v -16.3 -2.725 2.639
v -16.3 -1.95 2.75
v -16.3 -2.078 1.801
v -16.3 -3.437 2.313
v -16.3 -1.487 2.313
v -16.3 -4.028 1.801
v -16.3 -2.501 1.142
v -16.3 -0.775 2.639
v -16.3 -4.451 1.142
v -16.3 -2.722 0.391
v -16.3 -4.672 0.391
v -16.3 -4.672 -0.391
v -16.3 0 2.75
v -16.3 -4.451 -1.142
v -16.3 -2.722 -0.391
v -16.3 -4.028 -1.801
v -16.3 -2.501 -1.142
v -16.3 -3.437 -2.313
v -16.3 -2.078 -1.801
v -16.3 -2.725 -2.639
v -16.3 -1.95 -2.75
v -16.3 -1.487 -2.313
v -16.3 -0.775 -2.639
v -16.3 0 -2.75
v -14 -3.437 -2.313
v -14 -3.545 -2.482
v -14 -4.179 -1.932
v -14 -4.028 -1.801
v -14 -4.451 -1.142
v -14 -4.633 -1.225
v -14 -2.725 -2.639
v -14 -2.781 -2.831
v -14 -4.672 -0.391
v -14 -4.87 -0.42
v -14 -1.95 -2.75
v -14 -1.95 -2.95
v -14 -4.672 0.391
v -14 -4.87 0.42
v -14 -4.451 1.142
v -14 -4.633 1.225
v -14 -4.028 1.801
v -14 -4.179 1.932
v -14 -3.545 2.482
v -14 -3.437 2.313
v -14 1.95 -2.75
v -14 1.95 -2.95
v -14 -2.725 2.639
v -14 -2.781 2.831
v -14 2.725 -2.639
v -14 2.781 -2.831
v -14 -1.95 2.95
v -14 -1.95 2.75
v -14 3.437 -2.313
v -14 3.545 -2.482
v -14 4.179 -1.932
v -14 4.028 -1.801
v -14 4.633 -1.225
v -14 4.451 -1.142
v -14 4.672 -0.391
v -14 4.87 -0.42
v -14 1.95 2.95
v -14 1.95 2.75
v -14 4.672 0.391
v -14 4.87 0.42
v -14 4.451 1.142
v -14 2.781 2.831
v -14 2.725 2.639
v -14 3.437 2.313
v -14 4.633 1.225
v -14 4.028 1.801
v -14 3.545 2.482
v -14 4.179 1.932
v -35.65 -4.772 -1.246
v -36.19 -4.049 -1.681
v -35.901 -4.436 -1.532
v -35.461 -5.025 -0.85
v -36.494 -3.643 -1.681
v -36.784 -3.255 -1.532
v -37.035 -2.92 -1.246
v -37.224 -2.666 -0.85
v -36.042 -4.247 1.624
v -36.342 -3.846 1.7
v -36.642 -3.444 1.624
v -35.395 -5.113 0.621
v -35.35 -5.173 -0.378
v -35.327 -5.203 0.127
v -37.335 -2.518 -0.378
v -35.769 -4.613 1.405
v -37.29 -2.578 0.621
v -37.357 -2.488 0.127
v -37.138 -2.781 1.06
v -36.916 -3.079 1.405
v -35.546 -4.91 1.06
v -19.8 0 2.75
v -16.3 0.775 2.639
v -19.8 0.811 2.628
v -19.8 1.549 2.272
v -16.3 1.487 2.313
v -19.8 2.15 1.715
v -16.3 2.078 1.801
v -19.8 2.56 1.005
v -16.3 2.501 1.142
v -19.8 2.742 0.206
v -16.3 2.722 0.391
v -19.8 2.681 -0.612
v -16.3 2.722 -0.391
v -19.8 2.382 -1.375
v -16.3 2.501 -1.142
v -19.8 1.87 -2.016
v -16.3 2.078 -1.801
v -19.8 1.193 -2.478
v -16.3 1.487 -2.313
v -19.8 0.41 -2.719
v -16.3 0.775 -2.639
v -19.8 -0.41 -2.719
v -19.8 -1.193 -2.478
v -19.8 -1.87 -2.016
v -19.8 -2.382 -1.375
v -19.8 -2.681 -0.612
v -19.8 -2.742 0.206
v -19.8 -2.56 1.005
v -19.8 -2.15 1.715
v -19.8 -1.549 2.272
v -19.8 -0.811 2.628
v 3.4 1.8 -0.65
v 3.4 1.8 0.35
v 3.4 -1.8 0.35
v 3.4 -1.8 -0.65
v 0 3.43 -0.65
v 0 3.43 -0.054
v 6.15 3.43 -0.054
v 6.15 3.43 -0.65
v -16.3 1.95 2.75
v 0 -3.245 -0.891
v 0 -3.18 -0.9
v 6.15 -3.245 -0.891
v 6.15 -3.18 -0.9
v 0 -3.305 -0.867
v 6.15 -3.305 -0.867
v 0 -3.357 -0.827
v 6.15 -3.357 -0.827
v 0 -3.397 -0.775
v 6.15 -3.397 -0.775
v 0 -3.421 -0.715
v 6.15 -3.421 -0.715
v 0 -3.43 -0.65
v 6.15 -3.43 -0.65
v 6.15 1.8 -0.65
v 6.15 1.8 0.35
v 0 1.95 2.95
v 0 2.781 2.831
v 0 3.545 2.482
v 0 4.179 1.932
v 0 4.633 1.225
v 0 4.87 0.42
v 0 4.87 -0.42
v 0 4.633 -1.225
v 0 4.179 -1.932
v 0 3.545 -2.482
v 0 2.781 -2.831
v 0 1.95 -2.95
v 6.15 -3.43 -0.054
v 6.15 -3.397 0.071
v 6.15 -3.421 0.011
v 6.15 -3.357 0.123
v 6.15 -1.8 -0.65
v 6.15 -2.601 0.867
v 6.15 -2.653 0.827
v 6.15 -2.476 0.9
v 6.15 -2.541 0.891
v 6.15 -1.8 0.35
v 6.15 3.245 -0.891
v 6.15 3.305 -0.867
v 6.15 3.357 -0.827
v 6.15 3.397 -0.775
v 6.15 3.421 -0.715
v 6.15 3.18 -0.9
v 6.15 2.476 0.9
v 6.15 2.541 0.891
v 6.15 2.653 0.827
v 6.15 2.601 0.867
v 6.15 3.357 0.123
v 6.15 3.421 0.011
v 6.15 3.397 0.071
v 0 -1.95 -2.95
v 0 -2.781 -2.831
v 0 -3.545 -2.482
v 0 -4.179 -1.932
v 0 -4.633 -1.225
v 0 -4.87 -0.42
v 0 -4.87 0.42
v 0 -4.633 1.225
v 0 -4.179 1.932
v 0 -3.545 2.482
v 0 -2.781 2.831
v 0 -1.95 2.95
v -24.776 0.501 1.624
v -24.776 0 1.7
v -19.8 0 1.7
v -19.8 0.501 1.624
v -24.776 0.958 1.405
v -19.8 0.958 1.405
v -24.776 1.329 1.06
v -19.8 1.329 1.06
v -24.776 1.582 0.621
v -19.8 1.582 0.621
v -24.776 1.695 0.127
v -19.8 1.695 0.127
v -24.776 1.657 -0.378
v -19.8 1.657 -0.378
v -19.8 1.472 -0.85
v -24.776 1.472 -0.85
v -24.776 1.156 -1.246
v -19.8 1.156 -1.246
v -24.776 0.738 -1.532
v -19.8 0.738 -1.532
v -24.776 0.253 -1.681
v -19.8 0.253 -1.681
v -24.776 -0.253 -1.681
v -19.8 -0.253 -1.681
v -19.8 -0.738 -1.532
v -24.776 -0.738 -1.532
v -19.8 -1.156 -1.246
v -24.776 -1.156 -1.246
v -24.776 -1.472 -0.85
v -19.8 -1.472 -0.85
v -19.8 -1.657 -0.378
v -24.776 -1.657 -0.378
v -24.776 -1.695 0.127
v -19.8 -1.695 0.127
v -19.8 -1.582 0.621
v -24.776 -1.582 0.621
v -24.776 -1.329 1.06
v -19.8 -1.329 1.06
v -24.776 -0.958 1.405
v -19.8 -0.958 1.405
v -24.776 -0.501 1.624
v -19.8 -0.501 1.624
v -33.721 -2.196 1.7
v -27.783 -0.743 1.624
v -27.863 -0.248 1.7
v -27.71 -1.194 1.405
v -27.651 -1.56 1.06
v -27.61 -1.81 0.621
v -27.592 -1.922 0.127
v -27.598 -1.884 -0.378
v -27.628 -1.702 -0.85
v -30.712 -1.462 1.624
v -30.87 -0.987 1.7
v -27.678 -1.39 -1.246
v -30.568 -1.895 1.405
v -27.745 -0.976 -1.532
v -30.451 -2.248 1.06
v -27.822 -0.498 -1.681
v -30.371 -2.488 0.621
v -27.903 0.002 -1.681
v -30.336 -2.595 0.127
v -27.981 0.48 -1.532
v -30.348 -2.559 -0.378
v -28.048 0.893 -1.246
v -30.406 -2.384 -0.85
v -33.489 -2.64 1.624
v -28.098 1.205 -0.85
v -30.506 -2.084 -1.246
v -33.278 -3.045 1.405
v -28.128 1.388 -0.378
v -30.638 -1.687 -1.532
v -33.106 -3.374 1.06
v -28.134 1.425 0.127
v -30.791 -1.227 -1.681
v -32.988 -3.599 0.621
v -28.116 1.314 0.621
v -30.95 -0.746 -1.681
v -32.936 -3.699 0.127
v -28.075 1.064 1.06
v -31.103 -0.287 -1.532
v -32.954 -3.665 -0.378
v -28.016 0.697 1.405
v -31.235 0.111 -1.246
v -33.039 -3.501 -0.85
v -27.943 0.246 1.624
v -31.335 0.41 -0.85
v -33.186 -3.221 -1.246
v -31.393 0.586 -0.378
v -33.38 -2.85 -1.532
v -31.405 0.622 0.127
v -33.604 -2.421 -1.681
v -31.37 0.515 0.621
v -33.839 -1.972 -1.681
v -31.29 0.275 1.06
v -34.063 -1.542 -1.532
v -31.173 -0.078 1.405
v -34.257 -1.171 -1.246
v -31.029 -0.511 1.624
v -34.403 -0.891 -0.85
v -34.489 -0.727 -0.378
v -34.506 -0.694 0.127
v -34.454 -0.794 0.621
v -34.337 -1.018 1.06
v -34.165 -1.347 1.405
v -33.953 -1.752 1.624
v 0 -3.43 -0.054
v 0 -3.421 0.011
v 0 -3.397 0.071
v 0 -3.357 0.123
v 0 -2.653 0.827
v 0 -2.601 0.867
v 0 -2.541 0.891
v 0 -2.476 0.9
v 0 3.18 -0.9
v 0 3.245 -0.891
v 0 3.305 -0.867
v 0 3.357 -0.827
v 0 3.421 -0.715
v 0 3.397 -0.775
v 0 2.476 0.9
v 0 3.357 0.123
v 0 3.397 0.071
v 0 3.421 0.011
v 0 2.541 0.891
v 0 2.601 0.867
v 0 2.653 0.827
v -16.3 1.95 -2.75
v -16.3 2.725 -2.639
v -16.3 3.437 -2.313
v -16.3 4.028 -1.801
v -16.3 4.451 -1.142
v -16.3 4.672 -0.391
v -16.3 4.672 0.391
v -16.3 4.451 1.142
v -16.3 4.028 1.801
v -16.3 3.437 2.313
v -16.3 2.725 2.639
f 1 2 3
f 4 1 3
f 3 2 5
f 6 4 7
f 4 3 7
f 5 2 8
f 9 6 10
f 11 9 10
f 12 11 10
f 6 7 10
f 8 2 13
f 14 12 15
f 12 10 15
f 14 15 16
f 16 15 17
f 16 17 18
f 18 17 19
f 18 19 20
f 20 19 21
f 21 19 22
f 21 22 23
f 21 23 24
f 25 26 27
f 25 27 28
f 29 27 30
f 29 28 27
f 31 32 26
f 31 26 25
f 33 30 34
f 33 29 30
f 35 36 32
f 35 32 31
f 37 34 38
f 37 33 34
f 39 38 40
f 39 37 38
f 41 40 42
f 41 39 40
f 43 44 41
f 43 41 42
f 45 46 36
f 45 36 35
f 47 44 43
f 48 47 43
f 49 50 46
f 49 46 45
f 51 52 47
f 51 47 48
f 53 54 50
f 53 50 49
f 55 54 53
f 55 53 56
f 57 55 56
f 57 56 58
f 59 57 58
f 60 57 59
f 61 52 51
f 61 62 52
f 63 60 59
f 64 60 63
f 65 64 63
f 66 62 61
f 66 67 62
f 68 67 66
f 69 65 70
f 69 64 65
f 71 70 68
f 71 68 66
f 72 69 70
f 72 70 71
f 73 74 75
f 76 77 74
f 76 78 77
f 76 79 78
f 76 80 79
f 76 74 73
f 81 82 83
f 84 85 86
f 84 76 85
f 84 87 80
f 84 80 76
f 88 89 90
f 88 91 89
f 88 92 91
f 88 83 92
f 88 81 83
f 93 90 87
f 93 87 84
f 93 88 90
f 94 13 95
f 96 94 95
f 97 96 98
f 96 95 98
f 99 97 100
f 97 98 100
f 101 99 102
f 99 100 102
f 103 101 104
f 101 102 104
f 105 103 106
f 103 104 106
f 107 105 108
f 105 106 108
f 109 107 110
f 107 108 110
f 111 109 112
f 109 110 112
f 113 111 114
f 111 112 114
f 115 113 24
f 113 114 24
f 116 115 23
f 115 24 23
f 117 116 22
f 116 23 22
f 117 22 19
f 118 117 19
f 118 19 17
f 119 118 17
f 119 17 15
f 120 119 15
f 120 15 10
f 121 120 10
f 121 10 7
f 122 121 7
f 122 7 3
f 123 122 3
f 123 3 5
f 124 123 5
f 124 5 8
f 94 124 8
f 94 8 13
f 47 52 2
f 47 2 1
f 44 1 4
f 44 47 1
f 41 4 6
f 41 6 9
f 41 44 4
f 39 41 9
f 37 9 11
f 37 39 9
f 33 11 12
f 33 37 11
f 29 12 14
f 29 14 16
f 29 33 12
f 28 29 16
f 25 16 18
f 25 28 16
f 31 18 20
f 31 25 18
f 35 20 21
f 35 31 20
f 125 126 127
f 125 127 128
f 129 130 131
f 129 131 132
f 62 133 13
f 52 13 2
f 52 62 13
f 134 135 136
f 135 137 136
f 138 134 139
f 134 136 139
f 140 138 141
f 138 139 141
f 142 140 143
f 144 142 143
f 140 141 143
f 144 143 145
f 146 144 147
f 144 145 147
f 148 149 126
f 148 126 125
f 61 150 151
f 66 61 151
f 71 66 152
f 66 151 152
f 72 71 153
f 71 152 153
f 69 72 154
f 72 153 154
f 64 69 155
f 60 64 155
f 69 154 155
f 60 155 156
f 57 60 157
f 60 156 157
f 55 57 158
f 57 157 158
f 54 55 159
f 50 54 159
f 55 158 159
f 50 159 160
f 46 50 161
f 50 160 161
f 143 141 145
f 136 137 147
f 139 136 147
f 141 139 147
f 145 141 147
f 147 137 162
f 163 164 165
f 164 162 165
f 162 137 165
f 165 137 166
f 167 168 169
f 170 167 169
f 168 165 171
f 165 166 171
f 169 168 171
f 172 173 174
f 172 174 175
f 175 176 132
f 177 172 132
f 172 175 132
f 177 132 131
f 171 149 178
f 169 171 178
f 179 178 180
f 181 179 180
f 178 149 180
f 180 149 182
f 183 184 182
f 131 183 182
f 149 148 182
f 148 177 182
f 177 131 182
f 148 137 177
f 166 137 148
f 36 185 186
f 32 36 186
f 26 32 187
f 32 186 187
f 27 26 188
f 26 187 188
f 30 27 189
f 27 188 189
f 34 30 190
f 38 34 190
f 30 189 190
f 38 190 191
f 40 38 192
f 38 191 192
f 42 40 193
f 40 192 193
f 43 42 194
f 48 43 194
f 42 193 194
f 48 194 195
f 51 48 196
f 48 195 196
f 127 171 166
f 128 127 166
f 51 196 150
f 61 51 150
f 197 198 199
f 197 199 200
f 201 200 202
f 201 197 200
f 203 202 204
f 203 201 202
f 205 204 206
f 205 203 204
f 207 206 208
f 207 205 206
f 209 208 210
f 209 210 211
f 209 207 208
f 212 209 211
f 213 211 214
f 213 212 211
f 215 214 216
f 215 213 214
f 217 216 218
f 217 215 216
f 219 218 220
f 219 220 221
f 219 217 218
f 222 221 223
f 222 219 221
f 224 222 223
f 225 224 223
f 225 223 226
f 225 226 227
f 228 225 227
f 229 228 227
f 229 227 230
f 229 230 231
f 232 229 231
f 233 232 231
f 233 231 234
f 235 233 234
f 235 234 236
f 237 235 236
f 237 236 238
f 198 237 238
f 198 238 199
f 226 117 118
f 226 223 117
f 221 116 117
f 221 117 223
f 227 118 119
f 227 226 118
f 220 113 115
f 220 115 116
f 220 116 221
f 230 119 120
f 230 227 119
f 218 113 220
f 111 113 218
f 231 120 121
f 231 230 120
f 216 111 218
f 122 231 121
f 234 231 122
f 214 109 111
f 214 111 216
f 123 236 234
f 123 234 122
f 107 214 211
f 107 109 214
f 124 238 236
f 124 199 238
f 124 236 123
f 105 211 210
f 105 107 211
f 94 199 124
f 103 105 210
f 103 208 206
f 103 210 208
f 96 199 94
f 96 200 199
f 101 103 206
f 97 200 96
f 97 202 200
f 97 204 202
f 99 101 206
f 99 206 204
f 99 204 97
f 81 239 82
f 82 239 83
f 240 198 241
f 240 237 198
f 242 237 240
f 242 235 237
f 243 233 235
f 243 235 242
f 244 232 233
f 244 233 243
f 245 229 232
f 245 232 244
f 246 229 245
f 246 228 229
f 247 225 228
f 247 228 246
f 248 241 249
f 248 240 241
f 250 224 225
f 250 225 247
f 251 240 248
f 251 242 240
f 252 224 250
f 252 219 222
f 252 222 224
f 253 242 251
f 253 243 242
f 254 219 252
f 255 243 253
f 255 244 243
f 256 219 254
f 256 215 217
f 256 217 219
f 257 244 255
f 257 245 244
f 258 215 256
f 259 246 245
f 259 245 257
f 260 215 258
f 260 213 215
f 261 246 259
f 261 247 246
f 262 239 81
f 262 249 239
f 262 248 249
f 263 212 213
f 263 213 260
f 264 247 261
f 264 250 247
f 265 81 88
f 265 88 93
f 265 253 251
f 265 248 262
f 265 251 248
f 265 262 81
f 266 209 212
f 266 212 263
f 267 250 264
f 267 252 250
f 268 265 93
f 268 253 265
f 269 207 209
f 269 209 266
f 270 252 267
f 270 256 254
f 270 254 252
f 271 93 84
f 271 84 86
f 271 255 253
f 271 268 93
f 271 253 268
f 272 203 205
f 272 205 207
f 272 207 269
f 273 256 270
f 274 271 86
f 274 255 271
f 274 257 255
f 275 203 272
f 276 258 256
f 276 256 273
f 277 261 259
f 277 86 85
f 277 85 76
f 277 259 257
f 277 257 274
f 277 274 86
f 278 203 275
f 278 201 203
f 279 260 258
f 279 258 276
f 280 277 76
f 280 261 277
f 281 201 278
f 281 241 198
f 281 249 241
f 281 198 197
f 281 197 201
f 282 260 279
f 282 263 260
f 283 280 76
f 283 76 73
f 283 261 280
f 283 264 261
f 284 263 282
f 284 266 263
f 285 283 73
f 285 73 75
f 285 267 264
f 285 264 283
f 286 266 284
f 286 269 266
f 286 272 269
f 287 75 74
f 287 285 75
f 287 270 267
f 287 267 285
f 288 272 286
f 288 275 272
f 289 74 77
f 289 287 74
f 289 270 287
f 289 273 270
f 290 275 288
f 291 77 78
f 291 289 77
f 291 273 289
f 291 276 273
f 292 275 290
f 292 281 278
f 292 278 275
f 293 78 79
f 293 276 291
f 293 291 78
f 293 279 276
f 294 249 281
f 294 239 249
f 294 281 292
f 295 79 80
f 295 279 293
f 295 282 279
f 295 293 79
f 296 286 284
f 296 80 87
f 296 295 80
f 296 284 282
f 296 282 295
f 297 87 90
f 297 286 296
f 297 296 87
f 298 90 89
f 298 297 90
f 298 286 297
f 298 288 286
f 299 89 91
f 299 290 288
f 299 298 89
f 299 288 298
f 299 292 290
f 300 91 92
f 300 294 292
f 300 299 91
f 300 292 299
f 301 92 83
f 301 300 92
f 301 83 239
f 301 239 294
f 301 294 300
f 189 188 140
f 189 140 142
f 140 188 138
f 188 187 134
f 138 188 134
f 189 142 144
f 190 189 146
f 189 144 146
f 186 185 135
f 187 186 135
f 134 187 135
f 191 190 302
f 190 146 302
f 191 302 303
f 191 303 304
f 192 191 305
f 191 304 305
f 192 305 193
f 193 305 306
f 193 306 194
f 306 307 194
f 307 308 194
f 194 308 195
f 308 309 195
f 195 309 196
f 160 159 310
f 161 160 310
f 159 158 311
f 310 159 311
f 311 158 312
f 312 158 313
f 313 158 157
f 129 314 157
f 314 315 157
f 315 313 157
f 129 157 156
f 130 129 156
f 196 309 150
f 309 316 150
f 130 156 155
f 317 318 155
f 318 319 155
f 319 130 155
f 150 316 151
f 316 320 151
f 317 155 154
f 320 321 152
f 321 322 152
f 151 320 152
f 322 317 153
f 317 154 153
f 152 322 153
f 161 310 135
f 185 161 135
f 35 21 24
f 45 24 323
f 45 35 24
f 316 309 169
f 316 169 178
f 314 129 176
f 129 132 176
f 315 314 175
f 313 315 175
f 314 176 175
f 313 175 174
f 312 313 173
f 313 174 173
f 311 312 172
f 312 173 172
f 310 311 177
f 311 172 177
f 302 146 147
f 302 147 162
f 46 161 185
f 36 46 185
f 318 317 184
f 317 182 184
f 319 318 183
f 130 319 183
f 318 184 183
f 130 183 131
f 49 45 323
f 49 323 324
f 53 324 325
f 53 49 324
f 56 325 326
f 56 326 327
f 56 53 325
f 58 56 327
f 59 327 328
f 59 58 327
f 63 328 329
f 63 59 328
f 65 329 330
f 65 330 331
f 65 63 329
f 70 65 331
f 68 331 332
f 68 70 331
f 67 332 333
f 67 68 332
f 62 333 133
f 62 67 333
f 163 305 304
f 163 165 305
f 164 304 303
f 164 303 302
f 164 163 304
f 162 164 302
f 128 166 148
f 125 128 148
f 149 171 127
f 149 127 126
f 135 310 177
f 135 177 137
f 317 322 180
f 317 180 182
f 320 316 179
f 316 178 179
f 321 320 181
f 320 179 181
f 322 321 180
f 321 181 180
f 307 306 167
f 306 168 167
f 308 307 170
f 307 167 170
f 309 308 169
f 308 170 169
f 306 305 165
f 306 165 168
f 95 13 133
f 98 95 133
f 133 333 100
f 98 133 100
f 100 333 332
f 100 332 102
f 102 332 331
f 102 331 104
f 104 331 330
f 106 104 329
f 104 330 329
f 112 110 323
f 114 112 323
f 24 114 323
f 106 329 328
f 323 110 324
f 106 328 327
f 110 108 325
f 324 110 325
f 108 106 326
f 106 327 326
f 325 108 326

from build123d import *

# Parameters (mm, degrees)
EXTRUDE_1_DEPTH     = 14
EXTRUDE_2_DEPTH     = 2.3
SKETCH_4_R          = 2.75
EXTRUDE_3_DEPTH     = 3.5
SKETCH_5_R          = 1.7
EXTRUDE_4_DEPTH     = 6.15
FILLET_1_R          = 0.25
SKETCH_8_W          = 1
SKETCH_8_H          = 3.6
CUT_EXTRUDE_1_DEPTH = 2.75


with BuildPart() as part:
    # Эскиз1 → Бобышка-Вытянуть1 (new body)
    with BuildSketch(Plane(origin=(0, 0, 0), x_dir=(0, 0, -1), z_dir=(1, 0, 0))):
        with BuildLine():
            Line((-2.95, -1.95), (-2.95, 1.95))
            ThreePointArc((-2.95, 1.95), (0, 4.9), (2.95, 1.95))
            Line((2.95, 1.95), (2.95, -1.95))
            ThreePointArc((2.95, -1.95), (0, -4.9), (-2.95, -1.95))
        make_face()
    extrude(amount=-EXTRUDE_1_DEPTH)

    # Эскиз3 → Бобышка-Вытянуть2 (add)
    with BuildSketch(Plane.ZY.offset(14)):
        with BuildLine():
            Line((2.75, 1.95), (2.75, -1.95))
            ThreePointArc((2.75, -1.95), (0, -4.7), (-2.75, -1.95))
            Line((-2.75, -1.95), (-2.75, 1.95))
            ThreePointArc((-2.75, 1.95), (0, 4.7), (2.75, 1.95))
        make_face()
    extrude(amount=EXTRUDE_2_DEPTH)

    # Эскиз4 → Бобышка-Вытянуть3 (add)
    with BuildSketch(Plane.ZY.offset(16.3)):
        Circle(SKETCH_4_R)
    extrude(amount=EXTRUDE_3_DEPTH)

    # По траектории1: sweep along a path in Эскиз6
    with BuildLine(Plane.XY) as sweep_1_path:
        Line((-19.8, 0), (-24.776161806, 0))
        ThreePointArc((-24.776161806, 0), (-30.870449905, -0.986593903), (-36.342181829, -3.845591055))
    # Эскиз5 → По траектории1 (sweep)
    with BuildSketch(Plane.ZY.offset(19.8)):
        Circle(SKETCH_5_R)
    sweep(path=sweep_1_path.line)

    # Эскиз7 → Бобышка-Вытянуть4 (add)
    with BuildSketch(Plane(origin=(0, 0, 0), x_dir=(0, 0, -1), z_dir=(1, 0, 0))):
        Polygon((-0.05, -3.43), (-0.9, -2.58), (-0.9, 2.58), (-0.05, 3.43), (0.9, 3.43), (0.9, -3.43), align=None)
    extrude(amount=EXTRUDE_4_DEPTH)

    # Скругление1
    fillet_1_edges = [part.edges().sort_by_distance(p)[0] for p in [
        (3.075, 3.43, -0.9),
        (3.075, 3.43, 0.05),
        (3.075, 2.58, 0.9),
        (3.075, -2.58, 0.9),
        (3.075, -3.43, 0.05),
        (3.075, -3.43, -0.9),
    ]]
    fillet(fillet_1_edges, radius=FILLET_1_R)

    # Эскиз8 → Вырез-Вытянуть1 (cut)
    with BuildSketch(Plane(origin=(6.15, 0, 0), x_dir=(0, 0, -1), z_dir=(1, 0, 0))):
        with Locations((0.15, 0)):
            Rectangle(SKETCH_8_W, SKETCH_8_H)
    extrude(amount=-CUT_EXTRUDE_1_DEPTH, mode=Mode.SUBTRACT)


solid = part.part
